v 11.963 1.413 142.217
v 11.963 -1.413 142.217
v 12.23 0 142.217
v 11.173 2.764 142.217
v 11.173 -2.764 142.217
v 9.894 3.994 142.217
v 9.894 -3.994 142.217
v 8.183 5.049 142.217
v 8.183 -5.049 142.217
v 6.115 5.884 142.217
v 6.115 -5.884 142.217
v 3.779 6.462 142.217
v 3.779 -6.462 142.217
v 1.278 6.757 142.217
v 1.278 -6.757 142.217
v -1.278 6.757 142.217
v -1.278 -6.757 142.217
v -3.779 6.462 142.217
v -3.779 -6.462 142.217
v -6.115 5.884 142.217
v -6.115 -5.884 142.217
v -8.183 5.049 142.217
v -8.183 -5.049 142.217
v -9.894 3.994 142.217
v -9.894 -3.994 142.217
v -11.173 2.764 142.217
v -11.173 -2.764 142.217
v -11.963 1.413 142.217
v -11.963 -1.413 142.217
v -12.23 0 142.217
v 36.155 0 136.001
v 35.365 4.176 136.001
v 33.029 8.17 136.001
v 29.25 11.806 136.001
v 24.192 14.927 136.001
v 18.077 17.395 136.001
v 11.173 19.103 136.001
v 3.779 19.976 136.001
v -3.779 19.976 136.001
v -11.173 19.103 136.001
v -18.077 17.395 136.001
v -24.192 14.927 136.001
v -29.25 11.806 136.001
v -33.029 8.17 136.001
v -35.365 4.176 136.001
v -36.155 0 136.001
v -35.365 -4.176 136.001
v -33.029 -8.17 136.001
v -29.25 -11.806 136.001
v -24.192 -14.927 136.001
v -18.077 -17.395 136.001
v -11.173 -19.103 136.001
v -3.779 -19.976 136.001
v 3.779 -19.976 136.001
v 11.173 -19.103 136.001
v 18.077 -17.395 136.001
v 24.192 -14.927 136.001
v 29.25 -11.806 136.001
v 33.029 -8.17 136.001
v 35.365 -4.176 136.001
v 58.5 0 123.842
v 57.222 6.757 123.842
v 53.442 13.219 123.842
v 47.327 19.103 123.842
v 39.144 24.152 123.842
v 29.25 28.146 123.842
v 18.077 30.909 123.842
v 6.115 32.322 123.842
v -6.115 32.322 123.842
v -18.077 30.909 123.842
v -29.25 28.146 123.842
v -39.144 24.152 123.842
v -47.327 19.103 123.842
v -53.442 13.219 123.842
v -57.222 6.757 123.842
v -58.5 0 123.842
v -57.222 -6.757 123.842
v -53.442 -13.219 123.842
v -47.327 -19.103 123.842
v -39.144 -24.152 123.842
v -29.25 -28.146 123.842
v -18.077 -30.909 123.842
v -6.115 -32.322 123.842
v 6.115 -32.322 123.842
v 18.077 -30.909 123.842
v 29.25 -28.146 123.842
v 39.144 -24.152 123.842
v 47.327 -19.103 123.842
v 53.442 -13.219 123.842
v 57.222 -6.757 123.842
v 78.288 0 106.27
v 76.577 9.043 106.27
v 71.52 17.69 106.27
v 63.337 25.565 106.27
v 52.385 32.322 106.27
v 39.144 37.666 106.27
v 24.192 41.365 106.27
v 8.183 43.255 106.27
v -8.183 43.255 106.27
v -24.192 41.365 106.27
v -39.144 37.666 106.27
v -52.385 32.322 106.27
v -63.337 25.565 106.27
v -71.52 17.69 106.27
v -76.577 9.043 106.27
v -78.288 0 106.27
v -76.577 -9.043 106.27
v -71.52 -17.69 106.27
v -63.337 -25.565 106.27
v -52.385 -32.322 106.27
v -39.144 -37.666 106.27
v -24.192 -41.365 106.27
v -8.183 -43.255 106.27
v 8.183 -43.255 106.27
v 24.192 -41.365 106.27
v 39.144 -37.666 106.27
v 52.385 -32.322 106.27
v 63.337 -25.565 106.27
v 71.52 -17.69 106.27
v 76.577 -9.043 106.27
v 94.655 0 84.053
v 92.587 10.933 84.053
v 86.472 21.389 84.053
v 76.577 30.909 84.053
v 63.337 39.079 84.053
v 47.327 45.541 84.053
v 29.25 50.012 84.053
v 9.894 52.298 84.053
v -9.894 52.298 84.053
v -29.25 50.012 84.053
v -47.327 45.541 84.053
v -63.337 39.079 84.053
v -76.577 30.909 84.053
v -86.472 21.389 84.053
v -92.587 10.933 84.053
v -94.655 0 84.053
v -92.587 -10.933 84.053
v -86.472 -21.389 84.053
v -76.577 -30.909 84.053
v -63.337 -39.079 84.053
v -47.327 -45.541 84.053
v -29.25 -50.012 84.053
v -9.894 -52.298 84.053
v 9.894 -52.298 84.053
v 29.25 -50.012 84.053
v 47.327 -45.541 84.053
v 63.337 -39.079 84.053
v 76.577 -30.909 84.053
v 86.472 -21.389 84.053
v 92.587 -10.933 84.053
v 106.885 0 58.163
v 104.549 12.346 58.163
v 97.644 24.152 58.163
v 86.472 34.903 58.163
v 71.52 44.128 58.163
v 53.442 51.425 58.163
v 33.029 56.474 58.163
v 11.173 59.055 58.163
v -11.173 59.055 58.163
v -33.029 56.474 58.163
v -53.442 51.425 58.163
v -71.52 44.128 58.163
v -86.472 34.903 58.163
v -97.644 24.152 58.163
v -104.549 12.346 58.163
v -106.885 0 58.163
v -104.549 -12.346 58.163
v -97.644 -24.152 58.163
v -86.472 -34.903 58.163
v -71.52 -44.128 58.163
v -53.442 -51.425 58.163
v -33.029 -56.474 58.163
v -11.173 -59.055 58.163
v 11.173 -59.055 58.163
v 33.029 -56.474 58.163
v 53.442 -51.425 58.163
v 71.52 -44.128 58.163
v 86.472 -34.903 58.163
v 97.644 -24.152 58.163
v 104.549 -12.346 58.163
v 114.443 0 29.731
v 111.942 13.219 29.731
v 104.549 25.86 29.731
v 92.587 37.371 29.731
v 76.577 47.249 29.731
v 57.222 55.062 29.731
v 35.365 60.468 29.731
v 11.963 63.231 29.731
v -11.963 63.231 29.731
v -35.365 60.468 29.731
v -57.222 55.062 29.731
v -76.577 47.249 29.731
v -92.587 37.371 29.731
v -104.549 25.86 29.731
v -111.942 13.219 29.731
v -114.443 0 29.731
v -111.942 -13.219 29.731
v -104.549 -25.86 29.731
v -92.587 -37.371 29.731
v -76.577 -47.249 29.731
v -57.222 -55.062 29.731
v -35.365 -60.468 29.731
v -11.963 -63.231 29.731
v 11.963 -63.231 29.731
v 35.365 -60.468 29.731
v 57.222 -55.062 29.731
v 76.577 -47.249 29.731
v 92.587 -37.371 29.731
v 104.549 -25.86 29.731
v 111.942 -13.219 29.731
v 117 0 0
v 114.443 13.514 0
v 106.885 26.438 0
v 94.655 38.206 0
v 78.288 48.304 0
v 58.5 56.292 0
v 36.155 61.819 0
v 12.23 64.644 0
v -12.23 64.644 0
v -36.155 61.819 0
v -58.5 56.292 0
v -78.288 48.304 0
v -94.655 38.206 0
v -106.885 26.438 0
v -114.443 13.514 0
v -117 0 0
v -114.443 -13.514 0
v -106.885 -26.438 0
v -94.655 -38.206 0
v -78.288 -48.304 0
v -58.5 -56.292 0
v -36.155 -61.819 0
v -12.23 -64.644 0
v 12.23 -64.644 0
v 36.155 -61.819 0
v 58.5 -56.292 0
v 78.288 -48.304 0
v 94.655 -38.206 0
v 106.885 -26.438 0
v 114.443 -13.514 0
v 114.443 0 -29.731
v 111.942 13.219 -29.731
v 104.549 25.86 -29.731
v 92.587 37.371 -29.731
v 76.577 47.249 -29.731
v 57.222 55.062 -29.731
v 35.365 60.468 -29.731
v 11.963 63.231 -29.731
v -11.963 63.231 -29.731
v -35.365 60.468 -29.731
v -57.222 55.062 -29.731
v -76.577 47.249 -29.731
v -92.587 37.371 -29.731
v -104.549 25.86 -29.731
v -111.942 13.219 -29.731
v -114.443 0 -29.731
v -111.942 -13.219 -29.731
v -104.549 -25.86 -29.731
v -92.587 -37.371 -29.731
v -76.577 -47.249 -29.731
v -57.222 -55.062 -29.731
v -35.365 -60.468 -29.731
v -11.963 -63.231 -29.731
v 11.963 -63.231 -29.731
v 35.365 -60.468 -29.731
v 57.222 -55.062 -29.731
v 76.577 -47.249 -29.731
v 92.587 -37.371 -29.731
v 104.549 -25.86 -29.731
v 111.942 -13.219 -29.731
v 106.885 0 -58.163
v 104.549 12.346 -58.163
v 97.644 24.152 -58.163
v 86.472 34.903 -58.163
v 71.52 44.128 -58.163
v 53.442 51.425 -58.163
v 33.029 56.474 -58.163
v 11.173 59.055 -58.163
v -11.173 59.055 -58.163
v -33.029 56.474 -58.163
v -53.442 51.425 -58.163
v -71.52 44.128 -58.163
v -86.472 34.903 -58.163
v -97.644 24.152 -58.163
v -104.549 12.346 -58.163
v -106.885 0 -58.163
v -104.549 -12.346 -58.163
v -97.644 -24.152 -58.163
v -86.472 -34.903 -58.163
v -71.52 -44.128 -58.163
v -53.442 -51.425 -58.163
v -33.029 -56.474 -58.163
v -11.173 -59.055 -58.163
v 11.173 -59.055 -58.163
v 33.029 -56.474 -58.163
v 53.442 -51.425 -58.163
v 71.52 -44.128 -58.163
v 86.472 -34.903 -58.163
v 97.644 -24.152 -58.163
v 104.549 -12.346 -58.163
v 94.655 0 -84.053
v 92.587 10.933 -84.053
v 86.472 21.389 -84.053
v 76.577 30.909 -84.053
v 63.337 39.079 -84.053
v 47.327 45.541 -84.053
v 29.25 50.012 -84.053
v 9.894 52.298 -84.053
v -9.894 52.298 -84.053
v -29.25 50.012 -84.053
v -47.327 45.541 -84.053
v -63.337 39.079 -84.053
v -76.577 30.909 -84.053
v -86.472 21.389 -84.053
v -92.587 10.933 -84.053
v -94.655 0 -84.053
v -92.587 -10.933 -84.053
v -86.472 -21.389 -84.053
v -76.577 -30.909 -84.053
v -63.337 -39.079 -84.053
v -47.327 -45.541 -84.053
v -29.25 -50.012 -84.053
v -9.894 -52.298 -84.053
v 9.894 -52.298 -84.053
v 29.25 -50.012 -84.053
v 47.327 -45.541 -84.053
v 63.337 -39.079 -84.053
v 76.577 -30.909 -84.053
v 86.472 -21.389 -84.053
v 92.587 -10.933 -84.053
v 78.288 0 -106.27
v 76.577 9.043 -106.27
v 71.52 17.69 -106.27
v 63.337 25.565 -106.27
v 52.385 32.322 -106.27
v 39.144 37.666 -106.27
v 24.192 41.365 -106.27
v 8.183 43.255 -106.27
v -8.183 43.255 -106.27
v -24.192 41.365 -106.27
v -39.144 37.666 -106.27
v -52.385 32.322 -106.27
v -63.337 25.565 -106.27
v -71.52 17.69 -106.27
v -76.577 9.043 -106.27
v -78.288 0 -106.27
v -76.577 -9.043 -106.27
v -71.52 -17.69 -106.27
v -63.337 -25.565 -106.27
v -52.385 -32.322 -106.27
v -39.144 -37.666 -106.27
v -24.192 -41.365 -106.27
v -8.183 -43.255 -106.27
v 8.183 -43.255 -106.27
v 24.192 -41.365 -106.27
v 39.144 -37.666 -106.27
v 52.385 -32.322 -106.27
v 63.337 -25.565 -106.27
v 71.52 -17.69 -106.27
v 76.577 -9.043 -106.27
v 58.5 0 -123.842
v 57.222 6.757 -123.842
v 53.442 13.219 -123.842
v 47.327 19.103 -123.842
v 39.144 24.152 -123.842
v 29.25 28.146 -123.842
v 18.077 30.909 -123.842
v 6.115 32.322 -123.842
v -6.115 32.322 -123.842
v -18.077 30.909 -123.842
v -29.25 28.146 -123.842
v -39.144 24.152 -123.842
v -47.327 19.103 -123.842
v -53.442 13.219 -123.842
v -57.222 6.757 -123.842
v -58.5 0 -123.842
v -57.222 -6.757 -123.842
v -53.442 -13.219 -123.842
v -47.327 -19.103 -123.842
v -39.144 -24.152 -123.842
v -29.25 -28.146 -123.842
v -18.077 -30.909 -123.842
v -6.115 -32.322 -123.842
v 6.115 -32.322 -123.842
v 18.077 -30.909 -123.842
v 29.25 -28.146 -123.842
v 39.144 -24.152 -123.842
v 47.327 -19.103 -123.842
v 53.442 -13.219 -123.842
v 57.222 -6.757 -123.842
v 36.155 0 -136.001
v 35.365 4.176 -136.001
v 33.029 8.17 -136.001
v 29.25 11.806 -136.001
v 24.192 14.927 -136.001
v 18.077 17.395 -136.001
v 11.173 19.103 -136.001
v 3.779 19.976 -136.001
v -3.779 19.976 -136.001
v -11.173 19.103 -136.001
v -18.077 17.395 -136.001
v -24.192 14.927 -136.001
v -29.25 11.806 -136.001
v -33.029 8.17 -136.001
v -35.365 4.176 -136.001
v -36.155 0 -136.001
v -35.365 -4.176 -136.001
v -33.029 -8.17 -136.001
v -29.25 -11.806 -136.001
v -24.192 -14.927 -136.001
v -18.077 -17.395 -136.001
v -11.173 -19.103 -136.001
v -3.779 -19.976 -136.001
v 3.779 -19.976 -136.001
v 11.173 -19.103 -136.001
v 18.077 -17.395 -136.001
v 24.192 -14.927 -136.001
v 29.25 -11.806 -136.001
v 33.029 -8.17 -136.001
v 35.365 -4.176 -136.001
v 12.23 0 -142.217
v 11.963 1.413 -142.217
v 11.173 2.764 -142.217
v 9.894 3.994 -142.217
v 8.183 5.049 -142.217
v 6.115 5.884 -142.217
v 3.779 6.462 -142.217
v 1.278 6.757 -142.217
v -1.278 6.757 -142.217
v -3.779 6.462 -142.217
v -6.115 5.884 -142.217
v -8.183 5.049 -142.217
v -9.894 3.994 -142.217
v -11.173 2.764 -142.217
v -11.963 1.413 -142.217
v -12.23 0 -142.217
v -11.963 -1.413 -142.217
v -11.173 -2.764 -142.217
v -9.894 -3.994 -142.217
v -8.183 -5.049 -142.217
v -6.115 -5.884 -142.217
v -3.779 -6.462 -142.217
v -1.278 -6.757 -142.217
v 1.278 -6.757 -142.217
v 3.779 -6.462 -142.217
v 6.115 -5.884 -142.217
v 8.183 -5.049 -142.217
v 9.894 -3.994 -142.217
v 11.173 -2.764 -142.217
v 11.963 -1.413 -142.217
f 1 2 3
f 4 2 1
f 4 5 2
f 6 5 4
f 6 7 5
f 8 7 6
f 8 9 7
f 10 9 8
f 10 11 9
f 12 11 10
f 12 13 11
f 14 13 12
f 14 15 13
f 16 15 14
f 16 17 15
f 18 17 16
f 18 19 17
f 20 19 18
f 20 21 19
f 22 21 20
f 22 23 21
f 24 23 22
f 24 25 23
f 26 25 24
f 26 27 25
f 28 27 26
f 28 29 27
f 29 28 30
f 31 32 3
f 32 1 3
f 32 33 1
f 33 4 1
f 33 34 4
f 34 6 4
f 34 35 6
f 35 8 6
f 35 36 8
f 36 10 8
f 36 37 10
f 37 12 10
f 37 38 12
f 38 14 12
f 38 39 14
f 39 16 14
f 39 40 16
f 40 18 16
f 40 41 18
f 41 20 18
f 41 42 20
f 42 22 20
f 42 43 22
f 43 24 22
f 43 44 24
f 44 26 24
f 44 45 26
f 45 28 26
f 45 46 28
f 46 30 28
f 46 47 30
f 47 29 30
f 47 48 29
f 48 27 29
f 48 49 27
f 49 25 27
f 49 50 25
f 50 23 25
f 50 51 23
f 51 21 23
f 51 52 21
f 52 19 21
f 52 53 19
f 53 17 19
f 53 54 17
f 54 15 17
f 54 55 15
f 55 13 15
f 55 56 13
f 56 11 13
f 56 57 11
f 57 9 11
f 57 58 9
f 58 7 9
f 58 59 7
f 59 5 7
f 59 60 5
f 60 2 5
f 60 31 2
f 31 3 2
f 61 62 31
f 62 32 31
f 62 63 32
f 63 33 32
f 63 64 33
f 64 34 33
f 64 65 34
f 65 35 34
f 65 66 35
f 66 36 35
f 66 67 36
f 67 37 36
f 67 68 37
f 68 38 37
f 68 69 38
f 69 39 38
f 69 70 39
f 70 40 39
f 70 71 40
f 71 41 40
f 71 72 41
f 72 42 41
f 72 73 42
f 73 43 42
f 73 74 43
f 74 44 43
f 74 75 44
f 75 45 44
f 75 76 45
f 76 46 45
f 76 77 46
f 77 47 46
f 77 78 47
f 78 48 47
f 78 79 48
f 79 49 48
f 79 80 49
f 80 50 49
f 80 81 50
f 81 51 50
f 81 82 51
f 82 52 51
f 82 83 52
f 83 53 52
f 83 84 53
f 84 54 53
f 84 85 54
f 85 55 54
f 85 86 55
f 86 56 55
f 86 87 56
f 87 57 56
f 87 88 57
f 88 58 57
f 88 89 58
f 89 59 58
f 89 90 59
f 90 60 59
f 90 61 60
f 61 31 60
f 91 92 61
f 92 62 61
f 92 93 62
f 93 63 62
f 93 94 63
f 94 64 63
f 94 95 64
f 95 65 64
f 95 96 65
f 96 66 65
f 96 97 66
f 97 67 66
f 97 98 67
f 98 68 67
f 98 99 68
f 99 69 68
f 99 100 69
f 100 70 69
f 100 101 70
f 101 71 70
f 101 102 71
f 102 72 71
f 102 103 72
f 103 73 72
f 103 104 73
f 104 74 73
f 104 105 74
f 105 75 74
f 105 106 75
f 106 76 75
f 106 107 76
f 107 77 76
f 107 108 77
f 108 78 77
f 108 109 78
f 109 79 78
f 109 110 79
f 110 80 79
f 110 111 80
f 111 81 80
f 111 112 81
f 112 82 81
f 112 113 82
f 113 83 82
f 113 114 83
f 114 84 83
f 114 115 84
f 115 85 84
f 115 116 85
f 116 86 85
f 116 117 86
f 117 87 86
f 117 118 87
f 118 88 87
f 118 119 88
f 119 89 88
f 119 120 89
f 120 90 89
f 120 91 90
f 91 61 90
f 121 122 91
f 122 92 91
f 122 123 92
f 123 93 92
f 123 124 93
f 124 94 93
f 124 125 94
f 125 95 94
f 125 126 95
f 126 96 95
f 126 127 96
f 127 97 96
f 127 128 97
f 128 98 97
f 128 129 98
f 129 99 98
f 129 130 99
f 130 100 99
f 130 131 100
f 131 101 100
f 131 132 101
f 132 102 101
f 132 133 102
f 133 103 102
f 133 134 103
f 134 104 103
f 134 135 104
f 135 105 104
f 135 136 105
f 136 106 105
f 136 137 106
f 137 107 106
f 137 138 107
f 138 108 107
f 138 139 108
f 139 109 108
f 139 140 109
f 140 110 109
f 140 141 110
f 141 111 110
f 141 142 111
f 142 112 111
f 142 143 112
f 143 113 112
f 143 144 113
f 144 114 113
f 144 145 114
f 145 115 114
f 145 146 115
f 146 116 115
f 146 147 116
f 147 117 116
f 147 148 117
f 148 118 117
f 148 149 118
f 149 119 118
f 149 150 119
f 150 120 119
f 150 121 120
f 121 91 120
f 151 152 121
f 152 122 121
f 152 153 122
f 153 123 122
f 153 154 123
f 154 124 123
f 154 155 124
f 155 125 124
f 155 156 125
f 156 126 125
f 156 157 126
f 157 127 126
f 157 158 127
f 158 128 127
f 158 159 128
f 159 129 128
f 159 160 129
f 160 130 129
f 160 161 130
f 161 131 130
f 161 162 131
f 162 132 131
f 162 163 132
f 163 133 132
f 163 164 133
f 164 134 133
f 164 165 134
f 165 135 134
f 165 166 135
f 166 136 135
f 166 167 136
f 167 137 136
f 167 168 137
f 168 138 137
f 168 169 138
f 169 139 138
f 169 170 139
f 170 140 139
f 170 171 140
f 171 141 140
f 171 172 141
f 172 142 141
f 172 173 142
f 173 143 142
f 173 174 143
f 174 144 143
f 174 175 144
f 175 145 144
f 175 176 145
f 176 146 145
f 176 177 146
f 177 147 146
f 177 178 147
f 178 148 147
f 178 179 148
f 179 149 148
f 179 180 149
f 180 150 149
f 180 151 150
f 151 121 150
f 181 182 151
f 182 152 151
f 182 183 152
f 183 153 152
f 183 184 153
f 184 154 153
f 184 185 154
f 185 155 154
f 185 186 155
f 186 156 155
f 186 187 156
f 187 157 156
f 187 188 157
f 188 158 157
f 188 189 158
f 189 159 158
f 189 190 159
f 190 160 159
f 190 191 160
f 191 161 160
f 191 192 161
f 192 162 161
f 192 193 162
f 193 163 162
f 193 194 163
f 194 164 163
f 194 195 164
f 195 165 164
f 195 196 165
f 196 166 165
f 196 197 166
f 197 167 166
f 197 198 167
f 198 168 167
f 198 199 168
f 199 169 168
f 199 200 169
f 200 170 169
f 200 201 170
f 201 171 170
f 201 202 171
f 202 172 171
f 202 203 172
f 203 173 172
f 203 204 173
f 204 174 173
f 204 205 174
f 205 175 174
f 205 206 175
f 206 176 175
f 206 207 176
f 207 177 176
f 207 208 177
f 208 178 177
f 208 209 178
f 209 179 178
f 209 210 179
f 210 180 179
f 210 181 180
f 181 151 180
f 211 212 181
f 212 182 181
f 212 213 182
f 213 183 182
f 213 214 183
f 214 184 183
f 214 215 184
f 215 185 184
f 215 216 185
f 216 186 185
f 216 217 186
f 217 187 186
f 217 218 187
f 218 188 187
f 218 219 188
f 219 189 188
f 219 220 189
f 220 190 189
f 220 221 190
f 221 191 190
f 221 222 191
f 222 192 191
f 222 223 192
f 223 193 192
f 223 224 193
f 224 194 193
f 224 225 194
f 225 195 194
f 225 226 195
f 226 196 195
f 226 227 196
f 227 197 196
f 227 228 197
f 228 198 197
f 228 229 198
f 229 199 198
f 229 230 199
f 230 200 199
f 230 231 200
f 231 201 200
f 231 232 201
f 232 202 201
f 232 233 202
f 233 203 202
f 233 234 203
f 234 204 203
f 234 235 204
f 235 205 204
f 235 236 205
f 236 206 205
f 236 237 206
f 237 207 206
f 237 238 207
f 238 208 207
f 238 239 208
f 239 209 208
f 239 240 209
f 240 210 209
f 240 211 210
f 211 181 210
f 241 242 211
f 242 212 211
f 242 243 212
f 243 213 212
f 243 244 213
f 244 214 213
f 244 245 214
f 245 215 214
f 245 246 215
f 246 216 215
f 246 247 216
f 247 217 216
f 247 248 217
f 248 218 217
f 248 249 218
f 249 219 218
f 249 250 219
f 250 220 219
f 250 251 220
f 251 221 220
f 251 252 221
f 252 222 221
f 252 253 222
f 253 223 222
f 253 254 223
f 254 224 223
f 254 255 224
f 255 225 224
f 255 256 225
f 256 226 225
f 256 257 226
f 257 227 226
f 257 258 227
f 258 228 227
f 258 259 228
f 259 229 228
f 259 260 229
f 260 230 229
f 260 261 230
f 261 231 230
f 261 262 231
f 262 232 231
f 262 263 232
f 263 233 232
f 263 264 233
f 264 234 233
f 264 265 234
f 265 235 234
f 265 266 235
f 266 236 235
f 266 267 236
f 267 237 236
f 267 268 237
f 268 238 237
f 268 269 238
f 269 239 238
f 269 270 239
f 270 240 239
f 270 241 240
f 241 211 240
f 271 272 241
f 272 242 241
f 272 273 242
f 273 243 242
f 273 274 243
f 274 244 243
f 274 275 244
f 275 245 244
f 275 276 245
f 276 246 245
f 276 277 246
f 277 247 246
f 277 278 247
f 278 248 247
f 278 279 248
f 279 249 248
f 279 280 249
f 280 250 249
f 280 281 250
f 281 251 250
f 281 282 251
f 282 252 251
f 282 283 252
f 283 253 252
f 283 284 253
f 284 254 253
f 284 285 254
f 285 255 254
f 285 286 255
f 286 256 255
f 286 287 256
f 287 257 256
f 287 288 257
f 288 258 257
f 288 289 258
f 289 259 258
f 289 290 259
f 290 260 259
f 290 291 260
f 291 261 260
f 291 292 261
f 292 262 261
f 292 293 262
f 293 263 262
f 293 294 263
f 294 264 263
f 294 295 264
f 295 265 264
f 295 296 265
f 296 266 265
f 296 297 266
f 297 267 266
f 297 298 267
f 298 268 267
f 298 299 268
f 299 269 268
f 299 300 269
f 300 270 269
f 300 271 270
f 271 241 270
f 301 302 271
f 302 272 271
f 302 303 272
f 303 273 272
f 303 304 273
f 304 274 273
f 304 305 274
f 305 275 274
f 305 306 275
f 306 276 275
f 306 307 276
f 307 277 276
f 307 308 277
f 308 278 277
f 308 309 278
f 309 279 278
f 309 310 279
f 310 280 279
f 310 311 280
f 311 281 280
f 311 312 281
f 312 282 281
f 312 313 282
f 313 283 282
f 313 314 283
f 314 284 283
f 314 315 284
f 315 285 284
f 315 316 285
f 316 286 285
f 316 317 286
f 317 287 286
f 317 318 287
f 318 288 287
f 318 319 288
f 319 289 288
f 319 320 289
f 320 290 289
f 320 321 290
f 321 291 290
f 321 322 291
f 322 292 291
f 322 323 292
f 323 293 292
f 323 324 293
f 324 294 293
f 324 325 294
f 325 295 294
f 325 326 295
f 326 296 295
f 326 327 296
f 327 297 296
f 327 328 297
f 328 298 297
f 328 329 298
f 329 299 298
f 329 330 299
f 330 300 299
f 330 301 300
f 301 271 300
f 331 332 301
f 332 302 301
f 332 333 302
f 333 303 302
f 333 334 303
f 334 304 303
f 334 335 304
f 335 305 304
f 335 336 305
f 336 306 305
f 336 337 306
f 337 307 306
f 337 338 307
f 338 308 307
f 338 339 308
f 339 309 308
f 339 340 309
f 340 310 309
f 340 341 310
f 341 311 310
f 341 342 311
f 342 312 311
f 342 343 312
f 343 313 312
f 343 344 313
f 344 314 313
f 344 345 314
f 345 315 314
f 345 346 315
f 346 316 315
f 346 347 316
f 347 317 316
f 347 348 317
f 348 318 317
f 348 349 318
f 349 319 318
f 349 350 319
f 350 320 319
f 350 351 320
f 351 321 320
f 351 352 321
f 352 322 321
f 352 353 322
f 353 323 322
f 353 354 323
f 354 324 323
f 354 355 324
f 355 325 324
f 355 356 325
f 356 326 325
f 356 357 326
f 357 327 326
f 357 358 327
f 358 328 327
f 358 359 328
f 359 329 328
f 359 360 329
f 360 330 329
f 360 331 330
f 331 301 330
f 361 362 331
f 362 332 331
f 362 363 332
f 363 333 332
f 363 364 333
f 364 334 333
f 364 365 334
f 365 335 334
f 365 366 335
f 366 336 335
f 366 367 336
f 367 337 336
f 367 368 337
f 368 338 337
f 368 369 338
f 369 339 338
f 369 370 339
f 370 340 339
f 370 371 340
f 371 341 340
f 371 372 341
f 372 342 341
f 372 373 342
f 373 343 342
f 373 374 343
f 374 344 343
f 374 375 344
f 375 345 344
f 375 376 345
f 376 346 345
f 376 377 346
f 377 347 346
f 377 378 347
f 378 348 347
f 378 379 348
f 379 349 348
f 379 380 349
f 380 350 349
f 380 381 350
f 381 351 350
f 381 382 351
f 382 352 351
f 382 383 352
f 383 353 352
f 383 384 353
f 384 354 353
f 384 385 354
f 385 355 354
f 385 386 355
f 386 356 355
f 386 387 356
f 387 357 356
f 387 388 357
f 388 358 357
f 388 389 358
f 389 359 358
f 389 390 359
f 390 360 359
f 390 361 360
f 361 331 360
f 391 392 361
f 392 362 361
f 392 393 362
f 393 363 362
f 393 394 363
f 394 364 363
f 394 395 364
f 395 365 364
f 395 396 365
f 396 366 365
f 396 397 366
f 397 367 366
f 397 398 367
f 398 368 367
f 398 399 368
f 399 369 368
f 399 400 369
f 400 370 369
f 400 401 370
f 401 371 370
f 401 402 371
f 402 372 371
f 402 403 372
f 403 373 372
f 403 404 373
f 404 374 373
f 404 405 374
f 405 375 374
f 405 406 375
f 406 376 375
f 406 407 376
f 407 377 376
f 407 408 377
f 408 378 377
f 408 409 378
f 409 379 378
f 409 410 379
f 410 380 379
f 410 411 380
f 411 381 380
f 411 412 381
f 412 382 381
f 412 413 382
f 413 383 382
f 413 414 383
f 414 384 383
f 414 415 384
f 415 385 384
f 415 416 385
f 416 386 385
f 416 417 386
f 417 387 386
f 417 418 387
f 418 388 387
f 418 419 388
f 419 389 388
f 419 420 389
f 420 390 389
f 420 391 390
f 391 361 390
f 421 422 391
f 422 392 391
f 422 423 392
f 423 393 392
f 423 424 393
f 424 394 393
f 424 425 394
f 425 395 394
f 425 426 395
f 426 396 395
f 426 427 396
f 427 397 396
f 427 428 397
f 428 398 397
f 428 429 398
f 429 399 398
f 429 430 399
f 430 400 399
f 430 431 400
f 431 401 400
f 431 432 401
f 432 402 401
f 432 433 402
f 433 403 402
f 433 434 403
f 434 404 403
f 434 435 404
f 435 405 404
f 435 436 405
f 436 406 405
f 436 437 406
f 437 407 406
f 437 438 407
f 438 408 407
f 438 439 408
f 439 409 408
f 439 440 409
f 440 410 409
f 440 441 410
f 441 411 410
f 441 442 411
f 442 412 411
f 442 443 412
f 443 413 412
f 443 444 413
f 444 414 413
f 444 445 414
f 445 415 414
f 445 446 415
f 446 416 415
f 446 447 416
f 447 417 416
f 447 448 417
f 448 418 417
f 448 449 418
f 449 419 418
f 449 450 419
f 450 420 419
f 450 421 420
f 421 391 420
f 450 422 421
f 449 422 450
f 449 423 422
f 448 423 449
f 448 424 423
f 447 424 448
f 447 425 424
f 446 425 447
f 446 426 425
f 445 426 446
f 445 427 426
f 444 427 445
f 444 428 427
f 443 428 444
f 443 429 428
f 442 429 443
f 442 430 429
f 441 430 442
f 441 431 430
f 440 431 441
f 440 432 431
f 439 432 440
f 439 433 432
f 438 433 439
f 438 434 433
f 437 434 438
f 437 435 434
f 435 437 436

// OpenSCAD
// Generated by SolidPython 1.0.1 on 2020-07-29 00:46:48


scale(v = [9, 5, 11]) {
	sphere(r = 13);
}
/***********************************************
*********      SolidPython code:      **********
************************************************
 
# import packages: SolidPython
from solid import *
from solid.utils import *
from itertools import chain, combinations, permutations


class Resize:

    def __init__(self, scad_file):
        self.scad_file = scad_file
        #self.scad_file = import_scad(scad_file)
        # cone/cylinder param:
        self.r1 = 0
        self.r2 = 0
        self.h = 0
        # rectangular prism param:
        self.w = 0
        self.l = 0
        # ellipse param:
        self.r = 0

    # import OpenScad code (file name corresponds to shape)


    # classify shape + parameters
    def assign(self, param1, param2, param3):
        if self.scad_file == 'cone.scad':
            self.r1 = param1
            self.r2 = param2
            self.h = param3
        elif self.scad_file == 'cylinder.scad':
            self.r1 = param1
            self.r2 = param2
            self.h = param3
        elif self.scad_file == 'rectangularPrism.scad':
            self.h = param1
            self.l = param2
            self.w = param3
        else:
            self.r = param1
            self.h = param2

    # resize parameters
    def iterate(self):
        x = range(3, 20, 2)
        i = 1
        if self.scad_file == 'cone.scad':
            tempList = list(permutations(x, 2))
            for temp in tempList:
                param1 = temp[0]
                param2 = temp[1]
                filepath = 'produced_scad_files/' + 'cone' + str(param1) + '_' + str(param2) + '_' + '.scad'
                scad_render_to_file(cylinder(h=param1, r1=param2, r2=0), filepath)

        elif self.scad_file == 'cylinder.scad':
            tempList = list(permutations(x, 3))
            for temp in tempList:
                param1 = temp[0]
                param2 = temp[1]
                filepath = 'produced_scad_files/' + 'cylinder' + str(param1) + '_' + str(param2) + '_' + '.scad'
                scad_render_to_file(cylinder(h=param1, r1=param2, r2=param2), filepath)

        elif self.scad_file == 'rectangularPrism.scad':
            tempList = list(permutations(x, 3))
            for temp in tempList:
                param1 = temp[0]
                param2 = temp[1]
                param3 = temp[2]
                filepath = 'produced_scad_files/' + 'rectangularPrism' + str(param1) + '_' + str(param2) + '_' + str(
                    param3) + '.scad'
                scad_render_to_file(cube(size=(param1, param2, param3)), filepath)

        elif self.scad_file == 'ellipse.scad':
            tempList = list(permutations(x, 4))
            for temp in tempList:
                param1 = temp[0]
                param2 = temp[1]
                param3 = temp[2]
                param4 = temp[3]
                filepath = 'produced_scad_files/' + 'ellipse' + str(param1) + '_' + str(param2) + '_' + str(param3) + '_' + str(param4) + '.scad'
                scad_render_to_file(scale([param1, param2, param3])(sphere(r=param4)), filepath)

    def render_to_scadfile(self):
        scad_render_to_file(scad, 'example.scad') 
 
************************************************/
